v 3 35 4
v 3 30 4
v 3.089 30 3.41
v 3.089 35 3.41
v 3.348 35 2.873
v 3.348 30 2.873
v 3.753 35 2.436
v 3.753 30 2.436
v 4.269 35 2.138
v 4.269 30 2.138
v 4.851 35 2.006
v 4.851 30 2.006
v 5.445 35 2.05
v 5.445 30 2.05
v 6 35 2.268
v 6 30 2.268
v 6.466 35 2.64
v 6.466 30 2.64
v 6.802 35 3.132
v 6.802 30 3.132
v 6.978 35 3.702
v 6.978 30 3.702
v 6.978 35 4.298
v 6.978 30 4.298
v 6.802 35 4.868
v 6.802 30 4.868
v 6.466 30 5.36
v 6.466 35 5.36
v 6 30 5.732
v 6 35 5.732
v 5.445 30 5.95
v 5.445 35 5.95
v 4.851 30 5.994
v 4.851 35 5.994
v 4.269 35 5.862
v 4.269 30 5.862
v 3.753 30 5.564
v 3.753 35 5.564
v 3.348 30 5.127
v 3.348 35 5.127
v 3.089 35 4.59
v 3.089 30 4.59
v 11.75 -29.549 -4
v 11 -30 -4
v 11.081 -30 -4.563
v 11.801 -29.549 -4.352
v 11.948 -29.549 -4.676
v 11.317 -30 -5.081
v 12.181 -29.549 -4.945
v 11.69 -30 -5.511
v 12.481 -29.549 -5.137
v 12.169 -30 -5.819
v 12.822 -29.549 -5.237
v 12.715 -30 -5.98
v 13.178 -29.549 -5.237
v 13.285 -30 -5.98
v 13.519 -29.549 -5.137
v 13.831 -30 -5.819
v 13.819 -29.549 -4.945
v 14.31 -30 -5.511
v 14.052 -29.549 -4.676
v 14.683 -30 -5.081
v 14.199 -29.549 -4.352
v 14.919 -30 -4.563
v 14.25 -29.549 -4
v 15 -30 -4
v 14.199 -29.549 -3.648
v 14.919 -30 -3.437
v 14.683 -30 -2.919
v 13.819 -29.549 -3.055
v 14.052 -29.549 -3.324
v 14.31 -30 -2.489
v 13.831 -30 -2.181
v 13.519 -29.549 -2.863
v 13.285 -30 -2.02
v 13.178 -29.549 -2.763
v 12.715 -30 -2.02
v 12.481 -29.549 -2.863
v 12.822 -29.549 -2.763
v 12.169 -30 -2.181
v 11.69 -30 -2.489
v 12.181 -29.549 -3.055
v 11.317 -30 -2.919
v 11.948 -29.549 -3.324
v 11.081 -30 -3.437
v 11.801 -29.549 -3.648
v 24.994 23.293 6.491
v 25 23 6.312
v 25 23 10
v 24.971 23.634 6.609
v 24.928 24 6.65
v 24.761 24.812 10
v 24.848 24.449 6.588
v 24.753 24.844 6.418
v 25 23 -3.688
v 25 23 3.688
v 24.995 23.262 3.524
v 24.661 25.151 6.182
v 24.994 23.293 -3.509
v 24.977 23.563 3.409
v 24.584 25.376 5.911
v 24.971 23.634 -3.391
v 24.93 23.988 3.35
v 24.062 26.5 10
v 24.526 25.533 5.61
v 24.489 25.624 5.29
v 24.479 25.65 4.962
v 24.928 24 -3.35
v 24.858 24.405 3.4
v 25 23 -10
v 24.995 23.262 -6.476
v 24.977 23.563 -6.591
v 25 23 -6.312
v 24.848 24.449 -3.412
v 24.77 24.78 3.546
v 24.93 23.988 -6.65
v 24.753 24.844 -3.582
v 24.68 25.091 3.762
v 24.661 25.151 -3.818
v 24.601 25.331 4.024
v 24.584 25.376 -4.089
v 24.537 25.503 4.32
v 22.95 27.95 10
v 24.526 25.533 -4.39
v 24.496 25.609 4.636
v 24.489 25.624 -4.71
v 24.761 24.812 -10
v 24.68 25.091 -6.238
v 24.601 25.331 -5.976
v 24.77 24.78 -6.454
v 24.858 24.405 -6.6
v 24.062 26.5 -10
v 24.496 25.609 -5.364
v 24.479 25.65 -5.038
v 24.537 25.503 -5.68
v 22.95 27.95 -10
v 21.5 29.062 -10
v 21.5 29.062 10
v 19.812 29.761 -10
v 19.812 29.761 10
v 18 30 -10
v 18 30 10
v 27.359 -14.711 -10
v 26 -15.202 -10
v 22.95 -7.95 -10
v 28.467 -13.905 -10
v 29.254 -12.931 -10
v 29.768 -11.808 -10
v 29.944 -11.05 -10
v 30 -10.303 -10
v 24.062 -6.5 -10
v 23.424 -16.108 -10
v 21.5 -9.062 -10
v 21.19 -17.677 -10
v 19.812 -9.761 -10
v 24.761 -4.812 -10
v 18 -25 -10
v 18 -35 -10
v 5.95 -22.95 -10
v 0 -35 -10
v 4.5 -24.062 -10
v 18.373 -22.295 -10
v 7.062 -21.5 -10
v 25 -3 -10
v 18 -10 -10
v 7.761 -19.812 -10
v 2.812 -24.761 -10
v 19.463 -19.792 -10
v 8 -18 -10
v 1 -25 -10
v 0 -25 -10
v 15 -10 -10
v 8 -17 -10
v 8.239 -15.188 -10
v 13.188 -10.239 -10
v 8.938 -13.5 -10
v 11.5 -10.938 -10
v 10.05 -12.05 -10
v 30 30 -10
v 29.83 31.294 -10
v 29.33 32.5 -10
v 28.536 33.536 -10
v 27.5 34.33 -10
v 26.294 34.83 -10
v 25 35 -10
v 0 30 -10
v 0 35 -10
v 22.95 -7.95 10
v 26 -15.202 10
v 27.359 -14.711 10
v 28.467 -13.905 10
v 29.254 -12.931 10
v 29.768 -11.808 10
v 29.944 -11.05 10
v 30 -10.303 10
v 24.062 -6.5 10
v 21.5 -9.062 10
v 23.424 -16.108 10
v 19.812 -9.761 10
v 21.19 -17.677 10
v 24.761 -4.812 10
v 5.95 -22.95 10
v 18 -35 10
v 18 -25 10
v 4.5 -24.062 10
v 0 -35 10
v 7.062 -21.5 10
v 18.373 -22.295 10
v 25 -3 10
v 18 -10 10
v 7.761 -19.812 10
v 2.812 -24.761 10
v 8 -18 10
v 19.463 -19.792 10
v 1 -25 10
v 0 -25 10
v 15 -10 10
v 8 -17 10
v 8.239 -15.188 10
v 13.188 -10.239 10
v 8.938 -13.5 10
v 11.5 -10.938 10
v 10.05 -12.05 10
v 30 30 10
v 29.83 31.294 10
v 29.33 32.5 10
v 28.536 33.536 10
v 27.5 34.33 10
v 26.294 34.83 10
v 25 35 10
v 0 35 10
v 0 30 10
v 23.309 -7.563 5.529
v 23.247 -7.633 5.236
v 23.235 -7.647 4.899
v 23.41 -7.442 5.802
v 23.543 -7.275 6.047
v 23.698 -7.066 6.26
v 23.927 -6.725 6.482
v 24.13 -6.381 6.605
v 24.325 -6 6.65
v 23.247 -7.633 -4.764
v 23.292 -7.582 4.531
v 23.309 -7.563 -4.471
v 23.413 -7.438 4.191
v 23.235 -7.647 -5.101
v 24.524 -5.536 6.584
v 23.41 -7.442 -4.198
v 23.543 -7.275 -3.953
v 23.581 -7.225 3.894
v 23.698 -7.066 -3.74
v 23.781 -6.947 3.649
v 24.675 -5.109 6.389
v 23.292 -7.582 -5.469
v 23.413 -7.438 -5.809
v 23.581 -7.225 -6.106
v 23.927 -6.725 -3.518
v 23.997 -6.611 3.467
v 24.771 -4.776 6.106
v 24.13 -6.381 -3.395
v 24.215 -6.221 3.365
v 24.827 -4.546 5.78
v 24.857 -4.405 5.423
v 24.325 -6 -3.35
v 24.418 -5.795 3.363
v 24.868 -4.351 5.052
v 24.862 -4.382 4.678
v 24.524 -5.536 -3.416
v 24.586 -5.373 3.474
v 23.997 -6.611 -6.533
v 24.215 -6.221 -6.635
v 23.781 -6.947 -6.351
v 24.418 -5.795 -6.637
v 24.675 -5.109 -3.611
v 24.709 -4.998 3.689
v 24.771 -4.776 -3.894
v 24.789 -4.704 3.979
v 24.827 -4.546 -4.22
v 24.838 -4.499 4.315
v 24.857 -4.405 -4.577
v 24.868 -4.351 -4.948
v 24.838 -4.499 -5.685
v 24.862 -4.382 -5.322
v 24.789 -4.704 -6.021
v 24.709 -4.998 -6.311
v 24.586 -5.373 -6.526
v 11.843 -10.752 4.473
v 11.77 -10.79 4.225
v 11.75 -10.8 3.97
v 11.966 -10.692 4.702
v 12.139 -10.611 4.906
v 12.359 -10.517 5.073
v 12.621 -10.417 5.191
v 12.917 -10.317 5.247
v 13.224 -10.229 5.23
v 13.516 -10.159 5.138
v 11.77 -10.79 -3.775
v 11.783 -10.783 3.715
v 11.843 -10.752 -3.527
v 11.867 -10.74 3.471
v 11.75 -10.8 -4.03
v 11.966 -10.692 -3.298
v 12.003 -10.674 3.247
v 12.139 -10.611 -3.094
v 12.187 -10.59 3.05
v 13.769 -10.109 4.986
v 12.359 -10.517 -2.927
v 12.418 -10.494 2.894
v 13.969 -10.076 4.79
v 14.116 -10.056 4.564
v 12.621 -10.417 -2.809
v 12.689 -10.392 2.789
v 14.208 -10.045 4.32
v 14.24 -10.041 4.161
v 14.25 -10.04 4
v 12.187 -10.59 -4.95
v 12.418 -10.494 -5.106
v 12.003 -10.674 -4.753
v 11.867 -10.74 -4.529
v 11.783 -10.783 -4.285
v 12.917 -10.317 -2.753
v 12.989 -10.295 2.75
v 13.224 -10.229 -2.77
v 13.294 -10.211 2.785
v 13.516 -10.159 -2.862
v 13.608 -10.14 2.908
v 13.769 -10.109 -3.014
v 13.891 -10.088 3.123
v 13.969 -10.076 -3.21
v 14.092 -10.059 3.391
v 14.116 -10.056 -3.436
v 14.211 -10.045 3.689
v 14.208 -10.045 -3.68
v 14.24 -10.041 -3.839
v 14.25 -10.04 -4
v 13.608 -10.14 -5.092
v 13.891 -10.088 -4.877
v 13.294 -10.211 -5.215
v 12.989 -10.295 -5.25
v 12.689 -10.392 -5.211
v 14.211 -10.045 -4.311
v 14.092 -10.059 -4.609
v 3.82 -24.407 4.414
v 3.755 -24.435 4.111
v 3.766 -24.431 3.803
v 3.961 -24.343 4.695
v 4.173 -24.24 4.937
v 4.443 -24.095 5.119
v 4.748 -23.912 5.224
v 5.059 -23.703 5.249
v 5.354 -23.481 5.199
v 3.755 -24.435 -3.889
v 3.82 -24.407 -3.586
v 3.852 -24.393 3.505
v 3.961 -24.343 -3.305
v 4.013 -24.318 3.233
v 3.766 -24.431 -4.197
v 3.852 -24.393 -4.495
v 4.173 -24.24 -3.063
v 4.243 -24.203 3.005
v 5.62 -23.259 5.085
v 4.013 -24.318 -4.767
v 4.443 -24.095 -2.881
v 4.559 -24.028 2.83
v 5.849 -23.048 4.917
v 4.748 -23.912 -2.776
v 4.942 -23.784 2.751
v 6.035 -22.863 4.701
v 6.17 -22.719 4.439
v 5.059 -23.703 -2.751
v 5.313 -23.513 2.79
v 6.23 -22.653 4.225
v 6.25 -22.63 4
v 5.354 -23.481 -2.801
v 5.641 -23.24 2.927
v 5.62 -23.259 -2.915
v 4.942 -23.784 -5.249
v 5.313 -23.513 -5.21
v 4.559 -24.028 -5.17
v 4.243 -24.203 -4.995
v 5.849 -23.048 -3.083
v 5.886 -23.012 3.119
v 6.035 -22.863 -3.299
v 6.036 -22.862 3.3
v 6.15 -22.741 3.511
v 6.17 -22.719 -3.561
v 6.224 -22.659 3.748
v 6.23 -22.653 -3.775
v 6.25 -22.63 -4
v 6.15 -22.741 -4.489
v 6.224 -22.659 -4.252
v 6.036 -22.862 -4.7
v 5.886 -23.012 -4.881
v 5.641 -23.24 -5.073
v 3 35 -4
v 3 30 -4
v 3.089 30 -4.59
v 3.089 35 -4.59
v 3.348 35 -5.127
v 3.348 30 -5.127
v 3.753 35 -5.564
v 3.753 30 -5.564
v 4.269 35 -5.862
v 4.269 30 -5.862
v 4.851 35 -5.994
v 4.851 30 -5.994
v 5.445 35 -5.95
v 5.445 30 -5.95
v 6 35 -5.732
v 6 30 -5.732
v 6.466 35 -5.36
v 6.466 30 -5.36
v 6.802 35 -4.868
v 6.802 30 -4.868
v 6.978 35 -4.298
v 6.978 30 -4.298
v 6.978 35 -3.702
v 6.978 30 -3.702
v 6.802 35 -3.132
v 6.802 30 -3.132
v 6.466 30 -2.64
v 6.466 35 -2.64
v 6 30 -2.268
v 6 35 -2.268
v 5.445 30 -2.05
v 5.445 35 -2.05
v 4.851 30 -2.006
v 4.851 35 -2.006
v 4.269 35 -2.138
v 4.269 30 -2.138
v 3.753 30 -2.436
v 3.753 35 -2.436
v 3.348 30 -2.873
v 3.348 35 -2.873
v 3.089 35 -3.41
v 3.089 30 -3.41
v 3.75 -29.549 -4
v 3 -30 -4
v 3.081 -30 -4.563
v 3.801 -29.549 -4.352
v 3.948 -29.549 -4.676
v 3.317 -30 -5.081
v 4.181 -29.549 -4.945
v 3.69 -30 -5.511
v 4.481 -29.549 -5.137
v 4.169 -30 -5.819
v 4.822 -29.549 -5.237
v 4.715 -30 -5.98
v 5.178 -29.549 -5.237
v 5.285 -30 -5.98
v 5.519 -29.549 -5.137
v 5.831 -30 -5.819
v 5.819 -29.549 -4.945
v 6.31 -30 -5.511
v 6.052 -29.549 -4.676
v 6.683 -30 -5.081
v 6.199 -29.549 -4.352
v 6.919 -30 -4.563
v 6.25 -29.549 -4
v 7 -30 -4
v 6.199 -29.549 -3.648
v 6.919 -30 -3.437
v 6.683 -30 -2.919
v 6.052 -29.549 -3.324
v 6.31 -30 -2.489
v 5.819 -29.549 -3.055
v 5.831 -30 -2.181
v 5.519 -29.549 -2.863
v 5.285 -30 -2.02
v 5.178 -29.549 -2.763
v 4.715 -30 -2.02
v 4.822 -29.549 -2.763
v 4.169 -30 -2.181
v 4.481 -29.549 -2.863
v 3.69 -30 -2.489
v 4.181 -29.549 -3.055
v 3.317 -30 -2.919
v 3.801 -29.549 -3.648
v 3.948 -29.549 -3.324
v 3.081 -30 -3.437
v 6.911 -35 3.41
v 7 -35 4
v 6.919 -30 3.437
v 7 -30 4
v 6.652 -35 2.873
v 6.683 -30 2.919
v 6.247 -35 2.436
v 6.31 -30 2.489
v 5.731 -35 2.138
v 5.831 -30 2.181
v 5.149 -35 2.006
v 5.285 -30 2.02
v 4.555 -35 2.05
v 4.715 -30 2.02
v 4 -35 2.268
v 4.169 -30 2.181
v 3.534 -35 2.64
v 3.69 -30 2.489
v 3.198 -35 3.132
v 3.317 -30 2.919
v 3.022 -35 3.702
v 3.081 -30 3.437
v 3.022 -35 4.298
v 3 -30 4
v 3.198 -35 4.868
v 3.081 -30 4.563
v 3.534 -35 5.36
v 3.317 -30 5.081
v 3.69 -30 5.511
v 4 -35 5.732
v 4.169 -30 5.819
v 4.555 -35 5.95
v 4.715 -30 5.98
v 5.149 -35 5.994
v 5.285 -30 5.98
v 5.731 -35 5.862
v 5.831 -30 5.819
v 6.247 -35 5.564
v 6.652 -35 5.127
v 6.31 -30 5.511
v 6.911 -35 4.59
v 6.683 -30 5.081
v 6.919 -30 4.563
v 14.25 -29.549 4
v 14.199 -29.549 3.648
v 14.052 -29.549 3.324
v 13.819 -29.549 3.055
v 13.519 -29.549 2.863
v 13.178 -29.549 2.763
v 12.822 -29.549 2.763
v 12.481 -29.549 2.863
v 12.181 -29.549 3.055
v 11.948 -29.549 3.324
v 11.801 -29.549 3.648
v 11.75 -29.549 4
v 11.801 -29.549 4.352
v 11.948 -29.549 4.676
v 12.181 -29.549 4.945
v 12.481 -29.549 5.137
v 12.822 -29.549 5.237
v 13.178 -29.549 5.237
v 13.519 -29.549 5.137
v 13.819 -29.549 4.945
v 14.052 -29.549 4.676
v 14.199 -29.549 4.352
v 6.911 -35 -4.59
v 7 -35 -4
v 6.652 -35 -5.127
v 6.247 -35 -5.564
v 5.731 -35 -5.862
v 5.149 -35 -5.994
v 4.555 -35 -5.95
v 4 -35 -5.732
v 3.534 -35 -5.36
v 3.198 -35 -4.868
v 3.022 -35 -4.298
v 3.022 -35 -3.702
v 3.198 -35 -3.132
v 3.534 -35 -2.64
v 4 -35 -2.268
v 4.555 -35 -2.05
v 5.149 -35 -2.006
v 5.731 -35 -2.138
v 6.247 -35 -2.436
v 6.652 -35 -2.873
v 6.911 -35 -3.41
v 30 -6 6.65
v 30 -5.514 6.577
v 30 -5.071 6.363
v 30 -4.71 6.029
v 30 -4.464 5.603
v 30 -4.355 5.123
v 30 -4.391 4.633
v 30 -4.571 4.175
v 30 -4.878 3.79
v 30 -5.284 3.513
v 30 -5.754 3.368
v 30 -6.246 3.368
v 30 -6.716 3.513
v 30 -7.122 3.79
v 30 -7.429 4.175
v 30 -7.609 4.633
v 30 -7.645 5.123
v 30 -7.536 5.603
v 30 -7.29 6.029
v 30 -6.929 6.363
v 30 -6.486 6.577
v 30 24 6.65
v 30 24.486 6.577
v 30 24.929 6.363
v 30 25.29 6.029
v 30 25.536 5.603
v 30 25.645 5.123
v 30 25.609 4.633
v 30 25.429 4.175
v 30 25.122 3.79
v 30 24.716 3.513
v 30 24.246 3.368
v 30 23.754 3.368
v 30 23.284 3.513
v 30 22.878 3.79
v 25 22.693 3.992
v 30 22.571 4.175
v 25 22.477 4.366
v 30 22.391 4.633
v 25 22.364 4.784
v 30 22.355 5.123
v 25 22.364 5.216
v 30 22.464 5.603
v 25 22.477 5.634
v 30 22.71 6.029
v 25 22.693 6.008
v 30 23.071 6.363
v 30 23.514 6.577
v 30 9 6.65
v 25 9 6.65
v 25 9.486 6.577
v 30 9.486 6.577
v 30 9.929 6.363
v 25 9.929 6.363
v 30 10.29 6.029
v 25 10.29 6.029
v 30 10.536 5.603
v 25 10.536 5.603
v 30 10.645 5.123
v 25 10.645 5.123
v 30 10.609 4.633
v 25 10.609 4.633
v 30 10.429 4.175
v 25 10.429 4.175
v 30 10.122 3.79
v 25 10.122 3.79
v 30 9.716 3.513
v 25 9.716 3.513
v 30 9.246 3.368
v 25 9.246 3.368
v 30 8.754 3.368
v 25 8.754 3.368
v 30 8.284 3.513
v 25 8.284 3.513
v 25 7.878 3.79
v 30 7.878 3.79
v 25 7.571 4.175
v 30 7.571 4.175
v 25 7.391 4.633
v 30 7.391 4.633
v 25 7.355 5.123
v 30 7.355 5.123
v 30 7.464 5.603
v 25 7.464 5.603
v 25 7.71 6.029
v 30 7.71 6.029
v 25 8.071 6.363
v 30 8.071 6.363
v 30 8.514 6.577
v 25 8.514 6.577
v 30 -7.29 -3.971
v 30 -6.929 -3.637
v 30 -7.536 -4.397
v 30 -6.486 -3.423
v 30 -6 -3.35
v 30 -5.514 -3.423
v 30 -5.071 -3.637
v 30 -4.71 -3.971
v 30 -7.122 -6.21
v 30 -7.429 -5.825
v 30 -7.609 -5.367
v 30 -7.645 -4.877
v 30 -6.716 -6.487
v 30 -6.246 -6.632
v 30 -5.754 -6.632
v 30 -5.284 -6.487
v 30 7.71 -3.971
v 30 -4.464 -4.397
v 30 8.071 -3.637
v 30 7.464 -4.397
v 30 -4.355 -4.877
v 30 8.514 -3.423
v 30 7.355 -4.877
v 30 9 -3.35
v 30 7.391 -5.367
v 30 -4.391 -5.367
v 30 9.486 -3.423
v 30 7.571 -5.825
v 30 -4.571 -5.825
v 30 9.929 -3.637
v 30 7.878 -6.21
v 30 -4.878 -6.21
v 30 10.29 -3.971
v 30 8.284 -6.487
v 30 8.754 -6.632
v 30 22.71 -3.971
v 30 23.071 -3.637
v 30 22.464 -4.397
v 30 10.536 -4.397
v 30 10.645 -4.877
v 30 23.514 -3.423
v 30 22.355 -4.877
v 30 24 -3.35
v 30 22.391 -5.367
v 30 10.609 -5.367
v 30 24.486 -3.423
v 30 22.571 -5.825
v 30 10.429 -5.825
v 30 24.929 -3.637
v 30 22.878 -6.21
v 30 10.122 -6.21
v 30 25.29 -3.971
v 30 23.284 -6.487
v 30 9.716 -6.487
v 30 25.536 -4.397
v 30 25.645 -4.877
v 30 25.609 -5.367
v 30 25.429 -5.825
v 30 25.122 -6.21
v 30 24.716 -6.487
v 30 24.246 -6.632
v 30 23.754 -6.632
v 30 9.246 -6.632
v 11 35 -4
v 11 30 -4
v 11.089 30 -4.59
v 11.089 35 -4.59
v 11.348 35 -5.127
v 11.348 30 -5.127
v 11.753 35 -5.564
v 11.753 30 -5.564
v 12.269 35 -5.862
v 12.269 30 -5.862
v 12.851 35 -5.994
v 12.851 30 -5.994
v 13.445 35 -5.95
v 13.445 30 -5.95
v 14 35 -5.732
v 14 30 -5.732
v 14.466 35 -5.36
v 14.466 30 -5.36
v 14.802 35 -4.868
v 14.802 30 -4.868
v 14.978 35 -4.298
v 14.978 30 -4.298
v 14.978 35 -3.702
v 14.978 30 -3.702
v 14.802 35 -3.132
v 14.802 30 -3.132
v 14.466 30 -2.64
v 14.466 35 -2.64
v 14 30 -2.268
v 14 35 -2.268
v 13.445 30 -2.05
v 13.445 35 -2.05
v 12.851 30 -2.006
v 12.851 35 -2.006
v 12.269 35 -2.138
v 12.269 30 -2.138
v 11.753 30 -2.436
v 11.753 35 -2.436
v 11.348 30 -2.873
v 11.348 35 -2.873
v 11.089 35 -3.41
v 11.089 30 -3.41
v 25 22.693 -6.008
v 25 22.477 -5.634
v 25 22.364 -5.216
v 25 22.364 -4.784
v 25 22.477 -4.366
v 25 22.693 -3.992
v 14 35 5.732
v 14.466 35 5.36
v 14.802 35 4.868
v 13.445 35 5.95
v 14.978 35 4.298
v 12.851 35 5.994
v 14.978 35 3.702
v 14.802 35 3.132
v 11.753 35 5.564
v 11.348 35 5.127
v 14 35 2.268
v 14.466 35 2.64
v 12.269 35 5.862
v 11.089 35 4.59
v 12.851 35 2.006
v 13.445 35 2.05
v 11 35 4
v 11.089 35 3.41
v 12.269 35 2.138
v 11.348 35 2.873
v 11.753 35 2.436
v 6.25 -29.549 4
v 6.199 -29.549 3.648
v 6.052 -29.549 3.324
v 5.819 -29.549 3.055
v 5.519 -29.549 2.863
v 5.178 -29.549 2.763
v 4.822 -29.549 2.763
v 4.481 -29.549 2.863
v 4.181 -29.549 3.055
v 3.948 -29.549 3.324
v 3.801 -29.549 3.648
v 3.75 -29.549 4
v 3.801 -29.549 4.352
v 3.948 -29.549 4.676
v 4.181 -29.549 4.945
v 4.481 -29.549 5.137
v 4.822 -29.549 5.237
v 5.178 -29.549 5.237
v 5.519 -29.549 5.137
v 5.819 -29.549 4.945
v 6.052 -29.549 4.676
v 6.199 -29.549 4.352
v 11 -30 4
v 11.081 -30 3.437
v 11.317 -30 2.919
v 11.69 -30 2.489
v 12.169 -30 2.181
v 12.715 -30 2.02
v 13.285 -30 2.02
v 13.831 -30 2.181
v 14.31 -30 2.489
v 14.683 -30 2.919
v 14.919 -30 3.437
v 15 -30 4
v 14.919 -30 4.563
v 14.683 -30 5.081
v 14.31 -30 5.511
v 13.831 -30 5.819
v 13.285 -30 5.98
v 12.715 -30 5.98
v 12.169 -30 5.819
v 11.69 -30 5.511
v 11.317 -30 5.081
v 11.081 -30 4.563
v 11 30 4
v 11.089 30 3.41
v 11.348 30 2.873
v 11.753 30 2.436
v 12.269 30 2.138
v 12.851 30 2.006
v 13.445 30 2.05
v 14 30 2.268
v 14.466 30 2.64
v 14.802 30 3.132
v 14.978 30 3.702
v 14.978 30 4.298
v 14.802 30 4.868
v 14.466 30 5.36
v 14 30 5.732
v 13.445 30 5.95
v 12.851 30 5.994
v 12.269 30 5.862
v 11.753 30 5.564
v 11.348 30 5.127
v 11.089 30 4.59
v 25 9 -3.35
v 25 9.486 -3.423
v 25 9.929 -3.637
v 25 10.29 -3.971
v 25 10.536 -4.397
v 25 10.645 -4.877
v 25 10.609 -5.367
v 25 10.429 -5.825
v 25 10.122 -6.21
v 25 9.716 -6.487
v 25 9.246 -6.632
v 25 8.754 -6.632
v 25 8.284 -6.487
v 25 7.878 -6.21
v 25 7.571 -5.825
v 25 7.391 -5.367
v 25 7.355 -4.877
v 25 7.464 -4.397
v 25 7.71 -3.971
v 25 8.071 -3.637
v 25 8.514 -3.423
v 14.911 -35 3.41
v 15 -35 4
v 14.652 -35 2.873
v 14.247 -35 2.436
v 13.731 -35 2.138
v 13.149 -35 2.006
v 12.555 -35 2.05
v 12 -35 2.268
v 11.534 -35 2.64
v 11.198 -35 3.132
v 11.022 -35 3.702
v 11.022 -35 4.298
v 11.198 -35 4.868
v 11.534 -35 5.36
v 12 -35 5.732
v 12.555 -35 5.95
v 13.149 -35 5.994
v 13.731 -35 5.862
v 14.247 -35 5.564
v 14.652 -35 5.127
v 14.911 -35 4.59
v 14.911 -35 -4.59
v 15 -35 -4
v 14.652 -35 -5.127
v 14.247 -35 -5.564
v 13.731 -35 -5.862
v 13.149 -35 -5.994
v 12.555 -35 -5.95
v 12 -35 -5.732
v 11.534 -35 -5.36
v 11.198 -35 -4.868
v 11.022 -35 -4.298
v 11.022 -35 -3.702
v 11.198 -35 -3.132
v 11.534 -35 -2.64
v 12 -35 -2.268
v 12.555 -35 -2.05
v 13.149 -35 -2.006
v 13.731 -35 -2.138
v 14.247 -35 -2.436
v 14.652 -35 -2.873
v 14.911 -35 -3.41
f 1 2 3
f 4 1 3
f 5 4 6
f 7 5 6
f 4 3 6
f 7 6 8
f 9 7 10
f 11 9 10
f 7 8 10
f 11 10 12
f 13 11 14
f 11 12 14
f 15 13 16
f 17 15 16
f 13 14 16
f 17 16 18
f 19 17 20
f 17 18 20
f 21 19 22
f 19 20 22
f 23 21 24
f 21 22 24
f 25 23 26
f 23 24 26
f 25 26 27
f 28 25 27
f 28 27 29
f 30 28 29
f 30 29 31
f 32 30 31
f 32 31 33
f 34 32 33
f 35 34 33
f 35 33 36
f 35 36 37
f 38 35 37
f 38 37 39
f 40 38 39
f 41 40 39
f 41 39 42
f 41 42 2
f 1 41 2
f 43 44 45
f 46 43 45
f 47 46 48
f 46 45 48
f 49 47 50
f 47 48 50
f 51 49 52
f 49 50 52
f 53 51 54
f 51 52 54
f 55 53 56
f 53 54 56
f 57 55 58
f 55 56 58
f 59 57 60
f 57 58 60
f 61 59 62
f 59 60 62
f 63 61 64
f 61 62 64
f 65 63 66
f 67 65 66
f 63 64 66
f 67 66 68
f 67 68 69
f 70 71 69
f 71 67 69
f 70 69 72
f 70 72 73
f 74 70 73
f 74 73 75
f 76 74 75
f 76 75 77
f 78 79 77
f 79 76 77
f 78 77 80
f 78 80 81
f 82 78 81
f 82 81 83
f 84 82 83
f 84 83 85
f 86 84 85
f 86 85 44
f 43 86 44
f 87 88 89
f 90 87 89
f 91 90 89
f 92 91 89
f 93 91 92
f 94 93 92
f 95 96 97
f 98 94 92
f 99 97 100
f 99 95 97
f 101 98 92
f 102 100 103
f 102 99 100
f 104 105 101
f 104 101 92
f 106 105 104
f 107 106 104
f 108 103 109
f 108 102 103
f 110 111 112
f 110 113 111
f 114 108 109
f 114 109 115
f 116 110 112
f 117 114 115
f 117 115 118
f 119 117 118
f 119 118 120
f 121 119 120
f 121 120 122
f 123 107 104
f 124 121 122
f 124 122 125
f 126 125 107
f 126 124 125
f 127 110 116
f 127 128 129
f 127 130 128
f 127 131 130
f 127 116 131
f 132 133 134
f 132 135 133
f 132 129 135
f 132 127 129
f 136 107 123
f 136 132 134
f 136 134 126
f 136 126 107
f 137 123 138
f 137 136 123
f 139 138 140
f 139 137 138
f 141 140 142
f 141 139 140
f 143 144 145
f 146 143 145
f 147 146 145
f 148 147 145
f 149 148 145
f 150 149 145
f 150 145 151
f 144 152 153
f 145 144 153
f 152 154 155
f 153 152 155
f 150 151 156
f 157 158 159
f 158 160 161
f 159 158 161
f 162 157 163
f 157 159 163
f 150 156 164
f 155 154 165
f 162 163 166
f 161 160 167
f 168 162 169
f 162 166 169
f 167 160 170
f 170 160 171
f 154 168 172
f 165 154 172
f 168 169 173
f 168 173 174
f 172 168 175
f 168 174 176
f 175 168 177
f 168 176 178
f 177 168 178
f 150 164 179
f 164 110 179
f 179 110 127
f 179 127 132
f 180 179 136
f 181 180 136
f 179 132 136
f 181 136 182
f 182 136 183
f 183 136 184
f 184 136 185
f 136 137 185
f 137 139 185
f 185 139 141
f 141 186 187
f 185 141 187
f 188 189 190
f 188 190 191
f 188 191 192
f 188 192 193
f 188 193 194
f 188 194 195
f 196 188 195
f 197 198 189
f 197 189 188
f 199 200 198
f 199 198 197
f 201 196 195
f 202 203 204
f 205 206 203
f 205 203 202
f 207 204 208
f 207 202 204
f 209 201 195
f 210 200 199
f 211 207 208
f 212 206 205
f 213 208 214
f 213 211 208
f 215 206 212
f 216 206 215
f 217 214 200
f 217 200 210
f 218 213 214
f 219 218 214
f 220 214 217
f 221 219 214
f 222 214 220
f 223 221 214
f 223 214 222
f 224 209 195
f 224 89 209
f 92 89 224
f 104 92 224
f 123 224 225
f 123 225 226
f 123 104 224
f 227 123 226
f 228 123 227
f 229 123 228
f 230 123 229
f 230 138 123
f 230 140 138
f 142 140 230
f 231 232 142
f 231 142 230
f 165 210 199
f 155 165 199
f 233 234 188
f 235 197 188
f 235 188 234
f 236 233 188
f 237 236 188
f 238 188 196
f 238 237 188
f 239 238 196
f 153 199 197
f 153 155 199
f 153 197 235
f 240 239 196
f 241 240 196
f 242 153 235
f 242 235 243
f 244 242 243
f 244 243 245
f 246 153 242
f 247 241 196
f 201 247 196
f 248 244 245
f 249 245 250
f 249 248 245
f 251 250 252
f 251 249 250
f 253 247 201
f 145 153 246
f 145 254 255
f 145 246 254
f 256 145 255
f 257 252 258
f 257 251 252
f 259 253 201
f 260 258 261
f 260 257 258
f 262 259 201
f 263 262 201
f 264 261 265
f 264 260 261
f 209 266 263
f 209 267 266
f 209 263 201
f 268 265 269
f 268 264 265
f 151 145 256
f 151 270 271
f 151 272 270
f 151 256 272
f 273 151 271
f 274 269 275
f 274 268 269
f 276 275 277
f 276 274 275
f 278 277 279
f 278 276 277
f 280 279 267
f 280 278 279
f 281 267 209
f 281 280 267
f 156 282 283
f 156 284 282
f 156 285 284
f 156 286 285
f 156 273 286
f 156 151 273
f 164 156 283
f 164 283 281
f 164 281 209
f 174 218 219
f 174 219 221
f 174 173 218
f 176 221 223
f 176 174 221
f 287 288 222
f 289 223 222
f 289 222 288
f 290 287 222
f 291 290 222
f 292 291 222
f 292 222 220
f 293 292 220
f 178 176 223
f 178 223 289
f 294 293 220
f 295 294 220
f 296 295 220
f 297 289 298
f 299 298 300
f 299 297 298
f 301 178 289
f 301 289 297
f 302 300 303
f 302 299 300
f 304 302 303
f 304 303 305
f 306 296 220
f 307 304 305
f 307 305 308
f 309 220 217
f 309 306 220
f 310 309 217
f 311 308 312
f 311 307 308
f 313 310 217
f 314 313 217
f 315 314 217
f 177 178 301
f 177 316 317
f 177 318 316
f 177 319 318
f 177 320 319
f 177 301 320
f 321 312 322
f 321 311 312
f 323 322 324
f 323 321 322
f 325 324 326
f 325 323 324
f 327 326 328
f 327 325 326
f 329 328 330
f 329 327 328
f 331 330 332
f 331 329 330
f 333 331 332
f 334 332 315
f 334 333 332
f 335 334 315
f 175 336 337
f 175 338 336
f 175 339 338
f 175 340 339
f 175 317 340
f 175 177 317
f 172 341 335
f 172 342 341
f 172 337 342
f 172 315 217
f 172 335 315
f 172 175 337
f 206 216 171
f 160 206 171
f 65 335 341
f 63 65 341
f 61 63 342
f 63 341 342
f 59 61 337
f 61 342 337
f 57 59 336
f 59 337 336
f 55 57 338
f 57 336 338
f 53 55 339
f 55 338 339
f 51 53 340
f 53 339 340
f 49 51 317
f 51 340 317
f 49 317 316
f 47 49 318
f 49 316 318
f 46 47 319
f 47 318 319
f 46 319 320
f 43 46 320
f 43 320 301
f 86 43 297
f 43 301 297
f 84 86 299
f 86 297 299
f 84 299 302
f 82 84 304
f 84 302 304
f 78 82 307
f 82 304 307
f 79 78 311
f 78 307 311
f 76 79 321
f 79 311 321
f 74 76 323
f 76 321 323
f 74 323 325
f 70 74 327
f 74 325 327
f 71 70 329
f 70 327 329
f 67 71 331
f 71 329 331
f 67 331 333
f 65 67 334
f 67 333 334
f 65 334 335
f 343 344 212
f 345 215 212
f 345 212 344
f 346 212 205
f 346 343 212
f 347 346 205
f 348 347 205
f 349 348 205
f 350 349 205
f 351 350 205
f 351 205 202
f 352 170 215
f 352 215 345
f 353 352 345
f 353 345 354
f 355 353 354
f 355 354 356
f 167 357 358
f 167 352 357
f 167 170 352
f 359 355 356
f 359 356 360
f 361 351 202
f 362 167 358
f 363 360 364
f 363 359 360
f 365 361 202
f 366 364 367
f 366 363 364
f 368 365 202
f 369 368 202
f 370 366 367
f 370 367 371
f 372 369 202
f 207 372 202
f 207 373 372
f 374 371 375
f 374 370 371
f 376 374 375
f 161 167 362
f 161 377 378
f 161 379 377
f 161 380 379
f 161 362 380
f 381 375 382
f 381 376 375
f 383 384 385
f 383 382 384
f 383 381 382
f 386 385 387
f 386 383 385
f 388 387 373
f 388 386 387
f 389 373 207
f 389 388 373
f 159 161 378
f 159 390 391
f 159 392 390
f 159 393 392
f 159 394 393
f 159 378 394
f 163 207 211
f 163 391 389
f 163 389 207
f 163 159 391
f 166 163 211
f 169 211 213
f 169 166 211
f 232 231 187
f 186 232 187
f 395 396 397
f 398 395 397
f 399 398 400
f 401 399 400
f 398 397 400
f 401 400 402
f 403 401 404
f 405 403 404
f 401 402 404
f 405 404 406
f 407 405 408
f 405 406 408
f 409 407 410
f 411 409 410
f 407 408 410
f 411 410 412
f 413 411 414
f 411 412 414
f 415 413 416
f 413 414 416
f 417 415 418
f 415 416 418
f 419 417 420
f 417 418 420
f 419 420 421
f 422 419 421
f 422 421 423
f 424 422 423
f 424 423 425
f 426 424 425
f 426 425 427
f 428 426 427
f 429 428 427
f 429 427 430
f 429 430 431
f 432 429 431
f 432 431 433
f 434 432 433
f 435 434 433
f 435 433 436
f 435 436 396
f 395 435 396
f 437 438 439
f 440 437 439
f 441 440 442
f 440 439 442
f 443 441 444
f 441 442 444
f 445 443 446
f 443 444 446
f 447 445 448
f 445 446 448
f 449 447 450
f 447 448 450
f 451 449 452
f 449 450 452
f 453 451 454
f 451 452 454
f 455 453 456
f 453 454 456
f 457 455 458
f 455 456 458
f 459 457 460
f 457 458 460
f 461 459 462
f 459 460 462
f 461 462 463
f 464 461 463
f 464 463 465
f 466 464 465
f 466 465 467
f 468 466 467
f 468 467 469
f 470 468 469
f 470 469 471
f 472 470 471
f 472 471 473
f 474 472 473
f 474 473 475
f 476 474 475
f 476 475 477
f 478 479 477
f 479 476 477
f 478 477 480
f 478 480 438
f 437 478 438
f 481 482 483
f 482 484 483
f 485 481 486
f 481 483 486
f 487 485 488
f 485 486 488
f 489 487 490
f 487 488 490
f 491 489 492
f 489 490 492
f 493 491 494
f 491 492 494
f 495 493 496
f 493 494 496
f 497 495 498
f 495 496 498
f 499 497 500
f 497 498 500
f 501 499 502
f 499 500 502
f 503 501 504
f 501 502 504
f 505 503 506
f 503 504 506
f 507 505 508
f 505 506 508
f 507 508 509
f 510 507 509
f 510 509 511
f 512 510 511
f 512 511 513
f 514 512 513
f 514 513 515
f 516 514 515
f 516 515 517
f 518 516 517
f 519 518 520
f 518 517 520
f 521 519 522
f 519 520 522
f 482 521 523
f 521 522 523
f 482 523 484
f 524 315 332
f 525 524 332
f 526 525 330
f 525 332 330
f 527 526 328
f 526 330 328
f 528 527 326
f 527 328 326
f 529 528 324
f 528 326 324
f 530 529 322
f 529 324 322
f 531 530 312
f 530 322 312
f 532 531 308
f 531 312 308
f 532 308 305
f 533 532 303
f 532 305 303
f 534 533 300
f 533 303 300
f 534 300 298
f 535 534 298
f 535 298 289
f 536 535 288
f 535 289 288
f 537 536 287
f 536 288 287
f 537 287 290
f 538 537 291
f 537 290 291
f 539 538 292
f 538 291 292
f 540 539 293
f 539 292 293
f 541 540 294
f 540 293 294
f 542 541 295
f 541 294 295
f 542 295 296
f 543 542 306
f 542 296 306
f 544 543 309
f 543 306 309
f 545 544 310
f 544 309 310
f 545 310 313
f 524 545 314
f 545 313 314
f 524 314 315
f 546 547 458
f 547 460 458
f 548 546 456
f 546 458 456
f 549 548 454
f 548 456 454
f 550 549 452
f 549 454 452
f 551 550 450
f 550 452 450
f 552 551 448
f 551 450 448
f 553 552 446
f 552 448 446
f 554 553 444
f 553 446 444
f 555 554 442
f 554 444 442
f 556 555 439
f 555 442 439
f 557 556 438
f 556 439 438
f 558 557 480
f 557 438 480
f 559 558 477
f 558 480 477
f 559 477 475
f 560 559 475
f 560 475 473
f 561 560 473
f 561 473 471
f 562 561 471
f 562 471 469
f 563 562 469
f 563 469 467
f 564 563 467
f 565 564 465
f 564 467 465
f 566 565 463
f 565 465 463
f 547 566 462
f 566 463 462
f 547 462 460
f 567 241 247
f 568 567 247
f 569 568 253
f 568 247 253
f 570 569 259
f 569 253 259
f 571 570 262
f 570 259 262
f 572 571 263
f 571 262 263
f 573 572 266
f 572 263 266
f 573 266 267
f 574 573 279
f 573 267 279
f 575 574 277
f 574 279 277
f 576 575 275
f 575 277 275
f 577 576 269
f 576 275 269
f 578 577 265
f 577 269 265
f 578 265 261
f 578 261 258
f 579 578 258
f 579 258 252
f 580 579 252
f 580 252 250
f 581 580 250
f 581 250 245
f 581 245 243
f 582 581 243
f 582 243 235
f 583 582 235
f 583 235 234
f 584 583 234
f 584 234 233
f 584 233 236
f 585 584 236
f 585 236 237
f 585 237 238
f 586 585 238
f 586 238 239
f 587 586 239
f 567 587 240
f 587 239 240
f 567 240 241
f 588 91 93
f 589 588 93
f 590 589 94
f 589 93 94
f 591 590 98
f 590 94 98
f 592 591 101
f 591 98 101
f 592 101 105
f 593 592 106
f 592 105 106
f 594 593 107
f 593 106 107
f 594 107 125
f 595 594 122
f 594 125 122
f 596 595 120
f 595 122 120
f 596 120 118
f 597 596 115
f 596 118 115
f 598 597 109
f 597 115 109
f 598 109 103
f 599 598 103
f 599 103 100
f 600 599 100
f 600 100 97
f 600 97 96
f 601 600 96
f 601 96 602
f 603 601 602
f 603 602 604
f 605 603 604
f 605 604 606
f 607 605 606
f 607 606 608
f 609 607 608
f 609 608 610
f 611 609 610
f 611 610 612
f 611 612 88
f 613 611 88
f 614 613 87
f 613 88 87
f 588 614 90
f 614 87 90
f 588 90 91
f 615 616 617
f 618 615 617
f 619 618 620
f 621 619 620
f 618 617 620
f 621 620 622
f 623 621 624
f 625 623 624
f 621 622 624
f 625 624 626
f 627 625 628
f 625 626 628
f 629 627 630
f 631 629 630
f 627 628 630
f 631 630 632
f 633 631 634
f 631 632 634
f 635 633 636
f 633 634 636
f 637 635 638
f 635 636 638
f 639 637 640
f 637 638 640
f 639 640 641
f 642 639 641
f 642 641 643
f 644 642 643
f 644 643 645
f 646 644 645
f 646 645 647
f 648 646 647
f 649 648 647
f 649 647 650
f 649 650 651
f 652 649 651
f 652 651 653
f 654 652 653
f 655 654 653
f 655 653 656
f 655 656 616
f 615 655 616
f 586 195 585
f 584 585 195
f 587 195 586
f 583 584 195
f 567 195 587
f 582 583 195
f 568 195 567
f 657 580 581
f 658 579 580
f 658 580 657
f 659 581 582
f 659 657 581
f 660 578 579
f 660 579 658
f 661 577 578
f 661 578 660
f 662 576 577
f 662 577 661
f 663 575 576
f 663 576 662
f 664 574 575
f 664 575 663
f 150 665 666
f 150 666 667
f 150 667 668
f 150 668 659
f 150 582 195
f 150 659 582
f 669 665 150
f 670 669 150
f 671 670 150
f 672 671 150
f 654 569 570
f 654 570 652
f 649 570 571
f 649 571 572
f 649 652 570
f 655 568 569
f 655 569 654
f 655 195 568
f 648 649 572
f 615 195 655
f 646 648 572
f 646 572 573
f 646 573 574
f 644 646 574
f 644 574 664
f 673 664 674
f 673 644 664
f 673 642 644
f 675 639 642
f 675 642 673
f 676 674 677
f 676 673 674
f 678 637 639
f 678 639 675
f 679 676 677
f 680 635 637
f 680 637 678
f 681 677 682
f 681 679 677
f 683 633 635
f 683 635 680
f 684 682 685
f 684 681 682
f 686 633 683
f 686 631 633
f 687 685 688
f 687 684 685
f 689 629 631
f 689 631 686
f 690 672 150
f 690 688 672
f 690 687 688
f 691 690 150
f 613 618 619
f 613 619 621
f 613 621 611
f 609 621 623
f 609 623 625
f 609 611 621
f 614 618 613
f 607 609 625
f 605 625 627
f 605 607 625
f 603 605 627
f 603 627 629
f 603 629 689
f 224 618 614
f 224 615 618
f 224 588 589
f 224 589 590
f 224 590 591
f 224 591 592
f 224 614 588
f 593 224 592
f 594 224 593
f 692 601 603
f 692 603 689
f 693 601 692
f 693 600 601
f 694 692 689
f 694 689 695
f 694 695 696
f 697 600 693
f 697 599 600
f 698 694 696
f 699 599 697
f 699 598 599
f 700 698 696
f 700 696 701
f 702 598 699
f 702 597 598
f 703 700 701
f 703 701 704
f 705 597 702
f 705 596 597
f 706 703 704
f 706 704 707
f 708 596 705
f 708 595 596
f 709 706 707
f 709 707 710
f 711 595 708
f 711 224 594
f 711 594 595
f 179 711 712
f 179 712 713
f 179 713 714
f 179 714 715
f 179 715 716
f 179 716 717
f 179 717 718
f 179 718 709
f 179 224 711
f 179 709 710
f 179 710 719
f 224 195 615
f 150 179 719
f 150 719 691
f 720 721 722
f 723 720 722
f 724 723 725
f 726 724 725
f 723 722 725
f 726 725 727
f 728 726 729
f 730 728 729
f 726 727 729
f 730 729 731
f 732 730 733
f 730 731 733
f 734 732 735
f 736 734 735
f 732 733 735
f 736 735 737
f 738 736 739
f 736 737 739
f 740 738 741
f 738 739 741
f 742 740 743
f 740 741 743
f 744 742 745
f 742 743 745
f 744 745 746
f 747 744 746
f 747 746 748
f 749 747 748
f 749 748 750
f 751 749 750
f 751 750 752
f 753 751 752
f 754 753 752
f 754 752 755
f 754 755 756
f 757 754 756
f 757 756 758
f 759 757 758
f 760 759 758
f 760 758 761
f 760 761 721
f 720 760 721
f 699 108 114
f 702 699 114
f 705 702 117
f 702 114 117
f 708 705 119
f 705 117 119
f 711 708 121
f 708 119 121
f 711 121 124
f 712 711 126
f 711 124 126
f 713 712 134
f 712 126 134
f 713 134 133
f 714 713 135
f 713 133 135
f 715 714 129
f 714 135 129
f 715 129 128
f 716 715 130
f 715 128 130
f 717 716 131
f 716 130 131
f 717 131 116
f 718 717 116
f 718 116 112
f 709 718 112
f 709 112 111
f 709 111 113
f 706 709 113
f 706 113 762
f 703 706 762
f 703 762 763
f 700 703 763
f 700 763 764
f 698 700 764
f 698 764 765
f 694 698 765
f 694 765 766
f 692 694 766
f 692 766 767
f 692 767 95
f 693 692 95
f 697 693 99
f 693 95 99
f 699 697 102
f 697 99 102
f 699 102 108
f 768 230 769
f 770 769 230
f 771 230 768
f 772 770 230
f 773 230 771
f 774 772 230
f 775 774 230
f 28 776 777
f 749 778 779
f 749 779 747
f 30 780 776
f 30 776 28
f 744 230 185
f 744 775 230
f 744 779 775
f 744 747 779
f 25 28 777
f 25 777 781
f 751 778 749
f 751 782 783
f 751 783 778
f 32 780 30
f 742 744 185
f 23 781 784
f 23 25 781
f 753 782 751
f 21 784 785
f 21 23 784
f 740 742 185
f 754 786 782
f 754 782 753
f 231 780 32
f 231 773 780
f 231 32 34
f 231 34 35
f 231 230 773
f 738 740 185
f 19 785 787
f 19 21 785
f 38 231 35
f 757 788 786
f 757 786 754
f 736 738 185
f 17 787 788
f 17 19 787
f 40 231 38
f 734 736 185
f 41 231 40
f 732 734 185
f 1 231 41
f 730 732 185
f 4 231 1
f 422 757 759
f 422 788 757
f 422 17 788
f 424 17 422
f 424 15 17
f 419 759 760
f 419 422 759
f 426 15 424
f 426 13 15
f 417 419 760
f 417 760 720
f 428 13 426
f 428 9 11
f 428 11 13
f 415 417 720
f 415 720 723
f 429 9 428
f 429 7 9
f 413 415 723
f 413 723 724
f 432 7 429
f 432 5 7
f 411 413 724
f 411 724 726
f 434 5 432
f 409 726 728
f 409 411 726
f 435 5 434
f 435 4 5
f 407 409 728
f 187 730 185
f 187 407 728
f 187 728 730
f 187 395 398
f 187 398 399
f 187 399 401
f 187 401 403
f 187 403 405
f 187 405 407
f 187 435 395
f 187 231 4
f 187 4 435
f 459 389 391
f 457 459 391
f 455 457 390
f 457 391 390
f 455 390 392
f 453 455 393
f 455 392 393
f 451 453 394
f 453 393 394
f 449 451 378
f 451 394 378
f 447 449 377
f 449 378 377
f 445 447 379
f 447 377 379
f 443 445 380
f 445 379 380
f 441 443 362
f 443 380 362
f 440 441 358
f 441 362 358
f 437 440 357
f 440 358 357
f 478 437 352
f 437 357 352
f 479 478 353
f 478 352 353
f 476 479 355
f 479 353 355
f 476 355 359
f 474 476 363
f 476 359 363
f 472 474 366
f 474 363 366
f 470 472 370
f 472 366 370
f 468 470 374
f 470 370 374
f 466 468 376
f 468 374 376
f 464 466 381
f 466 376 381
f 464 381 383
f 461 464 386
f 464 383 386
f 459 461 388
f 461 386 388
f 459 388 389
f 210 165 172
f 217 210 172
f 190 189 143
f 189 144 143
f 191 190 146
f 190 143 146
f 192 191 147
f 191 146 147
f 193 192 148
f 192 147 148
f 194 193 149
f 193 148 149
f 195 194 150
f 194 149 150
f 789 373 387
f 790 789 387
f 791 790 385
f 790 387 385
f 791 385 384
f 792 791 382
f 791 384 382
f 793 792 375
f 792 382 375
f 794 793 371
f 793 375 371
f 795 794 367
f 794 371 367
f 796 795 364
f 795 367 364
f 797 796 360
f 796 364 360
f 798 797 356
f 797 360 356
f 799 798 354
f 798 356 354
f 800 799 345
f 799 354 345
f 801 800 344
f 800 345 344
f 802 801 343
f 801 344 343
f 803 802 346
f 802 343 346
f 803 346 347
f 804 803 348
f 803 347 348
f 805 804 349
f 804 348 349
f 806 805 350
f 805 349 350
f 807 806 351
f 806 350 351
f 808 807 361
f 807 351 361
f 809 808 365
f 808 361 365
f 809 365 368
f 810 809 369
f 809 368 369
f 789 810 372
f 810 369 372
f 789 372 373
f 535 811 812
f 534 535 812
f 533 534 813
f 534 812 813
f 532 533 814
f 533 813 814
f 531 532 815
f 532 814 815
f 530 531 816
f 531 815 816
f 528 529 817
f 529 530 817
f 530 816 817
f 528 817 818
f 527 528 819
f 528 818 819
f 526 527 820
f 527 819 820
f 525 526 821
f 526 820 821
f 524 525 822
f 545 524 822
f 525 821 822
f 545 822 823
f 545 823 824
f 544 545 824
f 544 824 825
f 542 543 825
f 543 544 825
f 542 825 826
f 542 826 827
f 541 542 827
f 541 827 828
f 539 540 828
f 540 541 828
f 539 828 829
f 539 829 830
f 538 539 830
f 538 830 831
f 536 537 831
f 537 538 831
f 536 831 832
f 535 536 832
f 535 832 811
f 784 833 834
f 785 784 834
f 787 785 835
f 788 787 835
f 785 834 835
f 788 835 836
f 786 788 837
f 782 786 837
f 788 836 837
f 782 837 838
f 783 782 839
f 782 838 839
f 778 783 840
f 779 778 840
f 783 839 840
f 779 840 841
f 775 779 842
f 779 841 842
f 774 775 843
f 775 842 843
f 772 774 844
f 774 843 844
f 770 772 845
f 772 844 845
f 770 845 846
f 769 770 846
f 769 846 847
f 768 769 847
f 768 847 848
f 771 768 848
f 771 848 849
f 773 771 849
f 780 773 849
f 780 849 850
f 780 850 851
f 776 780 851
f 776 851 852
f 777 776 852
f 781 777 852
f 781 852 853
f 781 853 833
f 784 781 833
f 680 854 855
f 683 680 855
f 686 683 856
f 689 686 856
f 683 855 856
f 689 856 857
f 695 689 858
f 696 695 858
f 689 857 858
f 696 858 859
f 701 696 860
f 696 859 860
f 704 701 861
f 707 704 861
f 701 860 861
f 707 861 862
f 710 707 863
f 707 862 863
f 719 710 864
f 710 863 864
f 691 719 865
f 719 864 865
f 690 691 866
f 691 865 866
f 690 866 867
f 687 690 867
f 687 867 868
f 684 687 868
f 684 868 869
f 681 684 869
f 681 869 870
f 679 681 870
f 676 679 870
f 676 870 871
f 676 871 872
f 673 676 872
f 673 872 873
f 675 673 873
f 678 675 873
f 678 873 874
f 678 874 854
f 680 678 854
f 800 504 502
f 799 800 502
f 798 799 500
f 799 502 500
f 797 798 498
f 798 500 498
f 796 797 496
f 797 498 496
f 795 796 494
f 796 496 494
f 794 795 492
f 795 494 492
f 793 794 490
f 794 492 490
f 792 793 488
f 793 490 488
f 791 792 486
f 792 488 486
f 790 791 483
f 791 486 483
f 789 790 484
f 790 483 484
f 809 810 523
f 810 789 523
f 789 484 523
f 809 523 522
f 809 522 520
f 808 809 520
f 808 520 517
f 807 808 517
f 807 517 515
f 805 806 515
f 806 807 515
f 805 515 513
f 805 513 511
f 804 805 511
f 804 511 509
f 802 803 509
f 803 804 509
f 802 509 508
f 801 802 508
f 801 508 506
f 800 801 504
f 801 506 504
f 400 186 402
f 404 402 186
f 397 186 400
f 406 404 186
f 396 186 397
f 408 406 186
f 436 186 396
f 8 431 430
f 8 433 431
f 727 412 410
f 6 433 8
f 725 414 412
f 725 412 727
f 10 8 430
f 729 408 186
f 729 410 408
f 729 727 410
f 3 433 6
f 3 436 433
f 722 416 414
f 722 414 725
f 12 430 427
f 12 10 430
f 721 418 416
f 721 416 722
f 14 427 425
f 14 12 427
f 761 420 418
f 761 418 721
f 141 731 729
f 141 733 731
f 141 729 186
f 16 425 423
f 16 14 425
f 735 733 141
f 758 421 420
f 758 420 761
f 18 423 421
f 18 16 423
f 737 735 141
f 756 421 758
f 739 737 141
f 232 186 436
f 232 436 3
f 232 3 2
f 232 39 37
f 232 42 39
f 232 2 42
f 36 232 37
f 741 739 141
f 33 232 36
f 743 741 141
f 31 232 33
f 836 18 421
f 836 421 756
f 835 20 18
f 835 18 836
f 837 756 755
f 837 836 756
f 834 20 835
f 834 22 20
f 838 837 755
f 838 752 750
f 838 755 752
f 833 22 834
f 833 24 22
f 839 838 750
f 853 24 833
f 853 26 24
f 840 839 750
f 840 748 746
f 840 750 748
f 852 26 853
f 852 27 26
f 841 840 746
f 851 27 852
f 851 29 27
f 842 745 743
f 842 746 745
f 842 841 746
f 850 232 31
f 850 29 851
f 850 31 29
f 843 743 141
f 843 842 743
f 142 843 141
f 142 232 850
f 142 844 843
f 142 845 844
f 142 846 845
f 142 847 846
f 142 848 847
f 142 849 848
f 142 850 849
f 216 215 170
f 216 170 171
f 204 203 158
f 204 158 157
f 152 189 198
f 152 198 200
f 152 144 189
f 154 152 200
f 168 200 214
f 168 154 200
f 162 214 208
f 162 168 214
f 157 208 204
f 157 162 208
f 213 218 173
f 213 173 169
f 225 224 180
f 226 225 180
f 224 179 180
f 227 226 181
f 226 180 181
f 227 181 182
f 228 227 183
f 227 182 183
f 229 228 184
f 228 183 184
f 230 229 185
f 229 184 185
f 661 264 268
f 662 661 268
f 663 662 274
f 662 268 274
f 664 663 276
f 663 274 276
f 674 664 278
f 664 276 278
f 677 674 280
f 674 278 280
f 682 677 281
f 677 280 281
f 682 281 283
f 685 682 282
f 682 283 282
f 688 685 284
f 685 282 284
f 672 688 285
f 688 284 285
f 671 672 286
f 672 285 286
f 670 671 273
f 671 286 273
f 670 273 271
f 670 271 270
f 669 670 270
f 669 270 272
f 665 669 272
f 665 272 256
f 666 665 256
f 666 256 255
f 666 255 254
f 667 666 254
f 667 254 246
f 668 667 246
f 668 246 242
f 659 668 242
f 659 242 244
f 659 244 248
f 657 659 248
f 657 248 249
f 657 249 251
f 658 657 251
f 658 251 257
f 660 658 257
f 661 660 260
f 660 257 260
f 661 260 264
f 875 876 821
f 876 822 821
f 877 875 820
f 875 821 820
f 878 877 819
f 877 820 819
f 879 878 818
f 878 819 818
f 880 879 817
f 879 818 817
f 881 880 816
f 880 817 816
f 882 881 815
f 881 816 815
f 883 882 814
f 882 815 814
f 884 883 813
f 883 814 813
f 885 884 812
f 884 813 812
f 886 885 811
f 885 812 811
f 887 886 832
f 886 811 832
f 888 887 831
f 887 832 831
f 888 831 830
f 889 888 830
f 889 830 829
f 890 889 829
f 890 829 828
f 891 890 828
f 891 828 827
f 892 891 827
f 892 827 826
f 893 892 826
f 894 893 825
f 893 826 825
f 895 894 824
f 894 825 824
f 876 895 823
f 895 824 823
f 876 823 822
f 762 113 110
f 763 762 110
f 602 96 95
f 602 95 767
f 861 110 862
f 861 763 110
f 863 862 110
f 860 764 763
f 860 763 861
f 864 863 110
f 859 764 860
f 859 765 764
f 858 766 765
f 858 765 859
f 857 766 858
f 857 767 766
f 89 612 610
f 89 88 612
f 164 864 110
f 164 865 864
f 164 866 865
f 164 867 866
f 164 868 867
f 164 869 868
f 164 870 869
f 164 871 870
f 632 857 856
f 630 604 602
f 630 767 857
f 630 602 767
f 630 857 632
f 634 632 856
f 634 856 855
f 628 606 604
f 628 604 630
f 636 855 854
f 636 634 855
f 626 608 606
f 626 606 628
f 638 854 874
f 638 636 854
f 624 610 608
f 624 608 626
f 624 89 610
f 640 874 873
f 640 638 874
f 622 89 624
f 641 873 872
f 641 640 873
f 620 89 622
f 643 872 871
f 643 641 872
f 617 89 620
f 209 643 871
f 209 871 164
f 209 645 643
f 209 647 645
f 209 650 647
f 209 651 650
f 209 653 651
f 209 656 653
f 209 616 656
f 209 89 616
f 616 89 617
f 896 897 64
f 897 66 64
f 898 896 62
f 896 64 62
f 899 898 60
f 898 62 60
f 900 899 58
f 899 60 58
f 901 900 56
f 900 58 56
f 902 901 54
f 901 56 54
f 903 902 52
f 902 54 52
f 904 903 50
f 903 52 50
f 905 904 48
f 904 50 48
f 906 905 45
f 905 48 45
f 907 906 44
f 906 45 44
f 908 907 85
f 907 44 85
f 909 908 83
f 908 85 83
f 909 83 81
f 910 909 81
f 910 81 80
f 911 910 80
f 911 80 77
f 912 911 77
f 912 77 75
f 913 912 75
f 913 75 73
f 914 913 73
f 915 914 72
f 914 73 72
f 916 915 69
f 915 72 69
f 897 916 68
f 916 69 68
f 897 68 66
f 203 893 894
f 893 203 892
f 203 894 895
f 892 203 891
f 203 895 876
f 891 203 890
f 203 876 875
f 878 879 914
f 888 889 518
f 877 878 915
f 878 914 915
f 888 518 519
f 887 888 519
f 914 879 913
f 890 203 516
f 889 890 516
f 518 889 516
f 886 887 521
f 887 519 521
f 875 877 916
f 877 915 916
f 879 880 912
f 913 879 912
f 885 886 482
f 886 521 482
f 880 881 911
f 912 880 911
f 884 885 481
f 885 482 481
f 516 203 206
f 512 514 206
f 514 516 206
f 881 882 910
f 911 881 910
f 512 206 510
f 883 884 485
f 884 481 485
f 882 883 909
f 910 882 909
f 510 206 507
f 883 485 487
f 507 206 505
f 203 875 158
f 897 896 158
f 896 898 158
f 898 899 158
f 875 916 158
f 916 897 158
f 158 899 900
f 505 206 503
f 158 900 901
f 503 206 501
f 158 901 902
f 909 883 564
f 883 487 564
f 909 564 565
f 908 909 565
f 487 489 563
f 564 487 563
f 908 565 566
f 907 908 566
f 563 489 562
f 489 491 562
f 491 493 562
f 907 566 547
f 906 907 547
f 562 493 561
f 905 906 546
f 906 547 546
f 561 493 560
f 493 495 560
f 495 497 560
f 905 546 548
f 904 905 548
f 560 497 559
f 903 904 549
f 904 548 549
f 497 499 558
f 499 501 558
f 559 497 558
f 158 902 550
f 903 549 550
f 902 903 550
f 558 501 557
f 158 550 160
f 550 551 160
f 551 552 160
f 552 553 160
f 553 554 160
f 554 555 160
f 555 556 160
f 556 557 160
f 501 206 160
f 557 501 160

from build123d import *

# Parameters (mm, degrees)
SKETCH1_W                      = 20
SKETCH1_H                      = 70
BOSS_EXTRUDE1_DEPTH            = 30
SKETCH2_W                      = 12
SKETCH2_H                      = 20
CUT_EXTRUDE1_DEPTH             = 51.249378106
FILLET1_R                      = 10
FILLET2_R                      = 5
CUT_EXTRUDE2_DEPTH             = 51.249378275
FILLET3_R                      = 7
FILLET4_R                      = 7
F_4_0_REAMED_HOLE_D            = 4
F_4_0_REAMED_HOLE_DEPTH        = 5
M3X0_5_TAPPED_HOLE1_D          = 2.5
F_4_0_REAMED_HOLE_BOTTOM_D     = 4
F_4_0_REAMED_HOLE_BOTTOM_DEPTH = 5
F_4_0_REAMED_HOLE_BOTTOM_TIP   = 1.201721238
M4X0_7_TAPPED_HOLE1_D          = 3.3
M4X0_7_TAPPED_HOLE1_DEPTH      = 10.1
M4X0_7_TAPPED_HOLE1_TIP        = 0.991420021


with BuildPart() as part:
    # Sketch1 → Boss-Extrude1 (new body)
    with BuildSketch(Plane(origin=(0, 0, 0), x_dir=(0, 0, -1), z_dir=(1, 0, 0))):
        Rectangle(SKETCH1_W, SKETCH1_H)
    extrude(amount=BOSS_EXTRUDE1_DEPTH)

    # Sketch2 → Cut-Extrude1 (cut, through all)
    with BuildSketch(Plane.XY.offset(10)):
        with Locations((24, -25)):
            Rectangle(SKETCH2_W, SKETCH2_H)
    extrude(amount=-CUT_EXTRUDE1_DEPTH, mode=Mode.SUBTRACT)

    # Fillet1
    fillet1_edges = [part.edges().sort_by_distance(p)[0] for p in [
        (18, -15, 0),
    ]]
    fillet(fillet1_edges, radius=FILLET1_R)

    # Fillet2
    fillet2_edges = [part.edges().sort_by_distance(p)[0] for p in [
        (30, 35, 0),
        (30, -15, 0),
    ]]
    fillet(fillet2_edges, radius=FILLET2_R)

    # Sketch6 → Cut-Extrude2 (cut, through all)
    with BuildSketch(Plane.XY.offset(10)):
        Polygon((0, 30), (25, 30), (25, -10), (8, -10), (8, -25), (0, -25), align=None)
    extrude(amount=-CUT_EXTRUDE2_DEPTH, mode=Mode.SUBTRACT)

    # Fillet3
    fillet3_edges = [part.edges().sort_by_distance(p)[0] for p in [
        (25, 30, 0),
        (25, -10, 0),
        (8, -25, 0),
    ]]
    fillet(fillet3_edges, radius=FILLET3_R)

    # Fillet4
    fillet4_edges = [part.edges().sort_by_distance(p)[0] for p in [
        (8, -10, 0),
    ]]
    fillet(fillet4_edges, radius=FILLET4_R)

    # Ø4.0 Reamed hole
    with Locations(Plane(origin=(0, 35, 0), x_dir=(1, 0, 0), z_dir=(0, 1, 0))):
        with Locations((5, -4), (5, 4), (13, 4), (13, -4)):
            Hole(F_4_0_REAMED_HOLE_D / 2, depth=F_4_0_REAMED_HOLE_DEPTH)

    # M3x0.5 Tapped Hole1 (through all)
    with Locations(Plane(origin=(0, -35, 0), x_dir=(-1, 0, 0), z_dir=(0, -1, 0))):
        with Locations((-5, -4), (-13, -4), (-5, 4), (-13, 4)):
            Hole(M3X0_5_TAPPED_HOLE1_D / 2)

    # Ø4.0 Reamed hole, bottom
    with Locations(Plane(origin=(0, -35, 0), x_dir=(-1, 0, 0), z_dir=(0, -1, 0))):
        with Locations((-5, -4), (-13, -4), (-13, 4), (-5, 4)):
            Hole(F_4_0_REAMED_HOLE_BOTTOM_D / 2, depth=F_4_0_REAMED_HOLE_BOTTOM_DEPTH)
            with Locations((0, 0, -(F_4_0_REAMED_HOLE_BOTTOM_DEPTH + F_4_0_REAMED_HOLE_BOTTOM_TIP / 2))):  # 118° drill point
                Cone(0, F_4_0_REAMED_HOLE_BOTTOM_D / 2, F_4_0_REAMED_HOLE_BOTTOM_TIP, mode=Mode.SUBTRACT)

    # M4x0.7 Tapped Hole1
    with Locations(Plane(origin=(30, 0, 0), x_dir=(0, 0, -1), z_dir=(1, 0, 0))):
        with Locations((-5, 24), (5, 24), (-5, 9), (5, 9), (-5, -6), (5, -6)):
            Hole(M4X0_7_TAPPED_HOLE1_D / 2, depth=M4X0_7_TAPPED_HOLE1_DEPTH)
            with Locations((0, 0, -(M4X0_7_TAPPED_HOLE1_DEPTH + M4X0_7_TAPPED_HOLE1_TIP / 2))):  # 118° drill point
                Cone(0, M4X0_7_TAPPED_HOLE1_D / 2, M4X0_7_TAPPED_HOLE1_TIP, mode=Mode.SUBTRACT)


solid = part.part
